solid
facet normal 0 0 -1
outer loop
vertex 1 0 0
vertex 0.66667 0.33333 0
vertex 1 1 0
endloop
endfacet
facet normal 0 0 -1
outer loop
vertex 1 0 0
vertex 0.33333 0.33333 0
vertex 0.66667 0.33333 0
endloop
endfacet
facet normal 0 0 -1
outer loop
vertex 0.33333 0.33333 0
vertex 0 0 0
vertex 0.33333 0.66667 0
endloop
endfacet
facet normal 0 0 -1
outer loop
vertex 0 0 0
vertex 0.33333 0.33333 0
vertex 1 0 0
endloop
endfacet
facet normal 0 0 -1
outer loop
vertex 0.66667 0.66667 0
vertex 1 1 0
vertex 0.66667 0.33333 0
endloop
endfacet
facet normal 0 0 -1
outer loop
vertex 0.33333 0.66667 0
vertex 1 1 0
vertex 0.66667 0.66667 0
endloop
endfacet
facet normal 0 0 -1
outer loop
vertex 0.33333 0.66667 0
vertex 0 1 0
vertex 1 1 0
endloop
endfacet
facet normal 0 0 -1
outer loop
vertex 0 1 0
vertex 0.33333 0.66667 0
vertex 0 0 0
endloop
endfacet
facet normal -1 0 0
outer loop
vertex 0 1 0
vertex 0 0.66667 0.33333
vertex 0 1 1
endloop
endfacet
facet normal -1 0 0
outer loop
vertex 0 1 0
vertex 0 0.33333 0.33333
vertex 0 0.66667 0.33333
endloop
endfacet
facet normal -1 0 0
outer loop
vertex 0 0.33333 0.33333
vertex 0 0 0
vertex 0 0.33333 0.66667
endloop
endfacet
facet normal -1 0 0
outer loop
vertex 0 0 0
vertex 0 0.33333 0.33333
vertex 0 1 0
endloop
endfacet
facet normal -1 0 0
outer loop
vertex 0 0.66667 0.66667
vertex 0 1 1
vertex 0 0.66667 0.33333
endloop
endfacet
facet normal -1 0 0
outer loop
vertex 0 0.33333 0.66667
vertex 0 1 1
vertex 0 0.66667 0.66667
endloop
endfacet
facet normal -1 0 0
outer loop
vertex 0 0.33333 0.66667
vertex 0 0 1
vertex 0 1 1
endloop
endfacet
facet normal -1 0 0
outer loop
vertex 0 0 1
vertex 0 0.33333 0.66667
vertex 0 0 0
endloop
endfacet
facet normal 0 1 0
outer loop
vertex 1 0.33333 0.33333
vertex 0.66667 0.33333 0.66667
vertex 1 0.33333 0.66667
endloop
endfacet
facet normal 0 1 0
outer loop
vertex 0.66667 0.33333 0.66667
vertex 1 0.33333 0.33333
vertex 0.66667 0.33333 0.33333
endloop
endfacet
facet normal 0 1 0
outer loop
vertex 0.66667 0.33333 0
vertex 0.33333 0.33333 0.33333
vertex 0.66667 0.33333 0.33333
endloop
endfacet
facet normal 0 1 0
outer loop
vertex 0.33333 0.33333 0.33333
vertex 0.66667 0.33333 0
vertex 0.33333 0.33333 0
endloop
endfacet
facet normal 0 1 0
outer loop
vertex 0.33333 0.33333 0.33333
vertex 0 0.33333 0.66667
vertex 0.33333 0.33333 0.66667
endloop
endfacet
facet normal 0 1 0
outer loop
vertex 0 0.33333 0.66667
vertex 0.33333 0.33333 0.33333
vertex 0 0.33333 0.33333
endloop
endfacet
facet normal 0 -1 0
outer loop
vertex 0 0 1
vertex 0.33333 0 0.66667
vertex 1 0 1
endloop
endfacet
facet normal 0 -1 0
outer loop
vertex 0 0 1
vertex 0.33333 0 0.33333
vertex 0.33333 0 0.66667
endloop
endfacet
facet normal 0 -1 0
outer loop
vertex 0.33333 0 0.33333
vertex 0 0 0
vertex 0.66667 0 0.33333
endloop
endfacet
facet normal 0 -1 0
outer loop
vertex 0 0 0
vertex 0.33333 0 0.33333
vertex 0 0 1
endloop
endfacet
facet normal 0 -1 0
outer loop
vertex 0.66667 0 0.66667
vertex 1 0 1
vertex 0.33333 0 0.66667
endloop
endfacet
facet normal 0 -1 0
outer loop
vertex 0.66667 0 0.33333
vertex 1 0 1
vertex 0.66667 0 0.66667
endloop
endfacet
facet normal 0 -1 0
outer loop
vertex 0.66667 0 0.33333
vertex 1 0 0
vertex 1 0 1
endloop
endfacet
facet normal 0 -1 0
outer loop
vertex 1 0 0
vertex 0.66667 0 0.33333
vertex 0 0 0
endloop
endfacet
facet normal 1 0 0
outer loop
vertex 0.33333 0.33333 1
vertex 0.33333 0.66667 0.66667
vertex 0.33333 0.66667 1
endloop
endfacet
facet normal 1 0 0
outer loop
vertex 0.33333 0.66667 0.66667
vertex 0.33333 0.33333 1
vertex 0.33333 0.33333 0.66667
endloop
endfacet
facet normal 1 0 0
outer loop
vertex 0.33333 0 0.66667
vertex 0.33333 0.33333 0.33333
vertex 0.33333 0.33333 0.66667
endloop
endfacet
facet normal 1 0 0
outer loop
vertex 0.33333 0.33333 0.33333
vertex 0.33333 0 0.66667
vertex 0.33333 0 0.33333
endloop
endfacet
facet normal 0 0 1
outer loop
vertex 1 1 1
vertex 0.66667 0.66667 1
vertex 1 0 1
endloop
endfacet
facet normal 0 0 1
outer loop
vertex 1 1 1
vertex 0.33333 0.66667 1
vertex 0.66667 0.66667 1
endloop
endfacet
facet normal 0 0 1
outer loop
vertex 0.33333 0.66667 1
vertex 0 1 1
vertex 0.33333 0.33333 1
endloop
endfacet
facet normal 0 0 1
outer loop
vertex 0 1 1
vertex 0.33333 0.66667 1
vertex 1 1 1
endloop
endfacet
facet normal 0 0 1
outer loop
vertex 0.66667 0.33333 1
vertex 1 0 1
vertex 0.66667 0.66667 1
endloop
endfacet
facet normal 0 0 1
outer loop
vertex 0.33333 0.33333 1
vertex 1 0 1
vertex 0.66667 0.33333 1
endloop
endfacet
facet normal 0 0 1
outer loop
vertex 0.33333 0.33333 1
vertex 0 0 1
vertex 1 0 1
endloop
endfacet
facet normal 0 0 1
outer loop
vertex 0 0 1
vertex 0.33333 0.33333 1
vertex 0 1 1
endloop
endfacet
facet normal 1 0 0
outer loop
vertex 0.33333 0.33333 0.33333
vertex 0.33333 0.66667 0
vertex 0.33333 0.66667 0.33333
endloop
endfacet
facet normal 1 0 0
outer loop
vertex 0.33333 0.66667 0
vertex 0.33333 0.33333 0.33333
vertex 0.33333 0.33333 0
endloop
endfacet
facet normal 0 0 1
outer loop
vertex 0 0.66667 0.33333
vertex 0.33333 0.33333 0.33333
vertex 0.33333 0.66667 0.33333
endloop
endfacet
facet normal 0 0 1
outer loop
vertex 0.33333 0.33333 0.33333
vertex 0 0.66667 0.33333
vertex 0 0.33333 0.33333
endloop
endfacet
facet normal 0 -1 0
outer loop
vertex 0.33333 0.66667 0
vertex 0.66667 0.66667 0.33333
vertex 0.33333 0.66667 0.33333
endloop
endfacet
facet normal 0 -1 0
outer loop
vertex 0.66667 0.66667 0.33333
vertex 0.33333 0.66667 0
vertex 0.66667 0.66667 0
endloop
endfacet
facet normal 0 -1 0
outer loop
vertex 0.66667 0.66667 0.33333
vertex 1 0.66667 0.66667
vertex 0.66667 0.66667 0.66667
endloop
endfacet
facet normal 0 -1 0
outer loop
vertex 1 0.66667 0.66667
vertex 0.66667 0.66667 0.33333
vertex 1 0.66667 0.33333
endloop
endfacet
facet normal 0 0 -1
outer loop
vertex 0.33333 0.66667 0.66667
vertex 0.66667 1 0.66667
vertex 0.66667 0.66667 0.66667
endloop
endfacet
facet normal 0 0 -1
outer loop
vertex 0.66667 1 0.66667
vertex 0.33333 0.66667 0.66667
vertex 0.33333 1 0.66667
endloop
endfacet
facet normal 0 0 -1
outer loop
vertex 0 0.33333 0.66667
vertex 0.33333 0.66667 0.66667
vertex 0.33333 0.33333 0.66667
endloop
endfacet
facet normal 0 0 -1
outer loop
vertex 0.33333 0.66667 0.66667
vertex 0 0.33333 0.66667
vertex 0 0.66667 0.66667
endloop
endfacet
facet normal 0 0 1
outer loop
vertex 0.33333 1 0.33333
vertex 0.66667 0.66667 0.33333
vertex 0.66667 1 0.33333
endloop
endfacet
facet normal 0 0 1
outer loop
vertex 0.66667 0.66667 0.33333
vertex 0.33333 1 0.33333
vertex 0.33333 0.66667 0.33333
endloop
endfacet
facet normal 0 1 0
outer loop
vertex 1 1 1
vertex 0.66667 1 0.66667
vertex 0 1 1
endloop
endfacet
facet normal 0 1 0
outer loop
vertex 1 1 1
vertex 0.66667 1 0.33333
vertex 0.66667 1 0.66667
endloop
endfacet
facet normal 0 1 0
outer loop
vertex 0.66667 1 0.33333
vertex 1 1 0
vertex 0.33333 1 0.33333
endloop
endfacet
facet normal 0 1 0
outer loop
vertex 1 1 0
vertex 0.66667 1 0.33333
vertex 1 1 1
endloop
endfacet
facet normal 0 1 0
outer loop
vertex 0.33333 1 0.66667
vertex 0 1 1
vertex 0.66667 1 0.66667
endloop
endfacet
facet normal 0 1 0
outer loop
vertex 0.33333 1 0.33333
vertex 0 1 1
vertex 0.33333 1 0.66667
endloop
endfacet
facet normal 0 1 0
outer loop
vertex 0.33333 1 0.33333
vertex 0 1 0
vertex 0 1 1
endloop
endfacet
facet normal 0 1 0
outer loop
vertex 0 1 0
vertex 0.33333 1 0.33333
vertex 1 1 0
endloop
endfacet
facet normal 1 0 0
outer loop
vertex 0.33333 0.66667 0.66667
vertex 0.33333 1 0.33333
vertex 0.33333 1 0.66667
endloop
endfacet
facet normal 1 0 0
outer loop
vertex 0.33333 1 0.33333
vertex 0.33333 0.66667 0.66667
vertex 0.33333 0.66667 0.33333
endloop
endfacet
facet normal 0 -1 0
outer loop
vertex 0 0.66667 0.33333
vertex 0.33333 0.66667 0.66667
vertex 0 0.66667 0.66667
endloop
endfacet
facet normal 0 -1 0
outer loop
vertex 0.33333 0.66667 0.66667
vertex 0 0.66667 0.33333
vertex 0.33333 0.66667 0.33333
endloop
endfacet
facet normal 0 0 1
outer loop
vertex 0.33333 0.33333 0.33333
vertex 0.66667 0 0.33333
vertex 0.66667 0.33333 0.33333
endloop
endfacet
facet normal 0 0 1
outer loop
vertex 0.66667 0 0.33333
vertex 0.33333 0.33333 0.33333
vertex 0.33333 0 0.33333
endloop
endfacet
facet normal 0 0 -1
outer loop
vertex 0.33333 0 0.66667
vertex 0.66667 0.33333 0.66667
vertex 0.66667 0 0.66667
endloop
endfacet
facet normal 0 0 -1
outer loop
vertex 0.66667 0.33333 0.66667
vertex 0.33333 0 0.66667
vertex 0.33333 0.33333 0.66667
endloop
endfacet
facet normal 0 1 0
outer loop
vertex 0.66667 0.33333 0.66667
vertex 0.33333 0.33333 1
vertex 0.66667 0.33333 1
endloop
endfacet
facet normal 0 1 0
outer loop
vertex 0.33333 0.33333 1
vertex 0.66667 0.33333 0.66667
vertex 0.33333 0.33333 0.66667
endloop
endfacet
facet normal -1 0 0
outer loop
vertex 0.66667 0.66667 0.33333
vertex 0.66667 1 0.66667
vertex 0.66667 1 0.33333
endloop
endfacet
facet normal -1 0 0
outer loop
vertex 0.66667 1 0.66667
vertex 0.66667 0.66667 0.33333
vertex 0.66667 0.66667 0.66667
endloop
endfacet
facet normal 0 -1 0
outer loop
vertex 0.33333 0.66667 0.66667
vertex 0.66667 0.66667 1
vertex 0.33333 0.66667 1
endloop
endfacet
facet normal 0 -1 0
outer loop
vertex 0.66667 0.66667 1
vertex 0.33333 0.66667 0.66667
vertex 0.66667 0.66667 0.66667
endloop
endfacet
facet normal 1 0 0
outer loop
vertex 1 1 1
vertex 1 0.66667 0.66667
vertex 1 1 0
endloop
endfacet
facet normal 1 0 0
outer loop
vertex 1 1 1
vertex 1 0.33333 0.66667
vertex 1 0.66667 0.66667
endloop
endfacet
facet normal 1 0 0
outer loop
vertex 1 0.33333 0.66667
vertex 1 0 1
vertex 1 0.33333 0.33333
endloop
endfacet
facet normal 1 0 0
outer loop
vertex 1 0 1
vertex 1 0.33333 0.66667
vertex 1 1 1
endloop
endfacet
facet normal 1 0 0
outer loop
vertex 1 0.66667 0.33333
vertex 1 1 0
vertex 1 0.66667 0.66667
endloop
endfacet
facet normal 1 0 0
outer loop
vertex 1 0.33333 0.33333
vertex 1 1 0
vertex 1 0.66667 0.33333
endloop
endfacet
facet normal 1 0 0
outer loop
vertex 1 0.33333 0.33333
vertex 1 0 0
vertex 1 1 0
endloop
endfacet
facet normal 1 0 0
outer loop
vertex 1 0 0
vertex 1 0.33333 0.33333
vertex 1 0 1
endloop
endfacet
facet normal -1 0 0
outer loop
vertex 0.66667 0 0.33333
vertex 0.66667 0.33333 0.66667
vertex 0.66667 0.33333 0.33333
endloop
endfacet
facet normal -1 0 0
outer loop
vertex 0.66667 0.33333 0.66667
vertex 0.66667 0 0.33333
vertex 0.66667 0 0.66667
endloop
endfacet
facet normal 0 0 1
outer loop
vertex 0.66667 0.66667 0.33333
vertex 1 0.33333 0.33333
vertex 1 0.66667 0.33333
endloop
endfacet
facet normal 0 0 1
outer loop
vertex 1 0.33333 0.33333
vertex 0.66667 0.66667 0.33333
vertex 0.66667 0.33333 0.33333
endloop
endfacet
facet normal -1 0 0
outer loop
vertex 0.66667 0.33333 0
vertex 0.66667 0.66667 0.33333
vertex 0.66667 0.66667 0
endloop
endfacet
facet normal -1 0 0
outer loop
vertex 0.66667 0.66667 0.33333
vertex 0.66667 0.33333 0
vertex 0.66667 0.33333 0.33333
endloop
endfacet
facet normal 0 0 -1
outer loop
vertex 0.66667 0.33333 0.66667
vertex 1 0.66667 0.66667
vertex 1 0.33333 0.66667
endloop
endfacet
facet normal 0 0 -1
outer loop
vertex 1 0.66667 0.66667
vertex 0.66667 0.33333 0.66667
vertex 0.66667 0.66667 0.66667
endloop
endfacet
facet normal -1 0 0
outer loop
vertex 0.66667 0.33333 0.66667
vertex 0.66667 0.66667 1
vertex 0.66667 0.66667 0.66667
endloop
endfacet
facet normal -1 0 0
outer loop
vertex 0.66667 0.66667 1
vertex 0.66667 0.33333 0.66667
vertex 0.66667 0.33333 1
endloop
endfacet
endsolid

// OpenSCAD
/* [Sponge] */

//  Type of sponge
sponge_type = 0;    // [0:#0 - Menger sponge,1:#1 - diagonal,2:#2 - pyramid00,3:#3 - pyramid01,4:#4 - pyramid10,5:#5 - pyramid11]

//  NOTE:   The original Menger sponge has 20^L cubes, where L is the
//          level. So, on level 8, we have 20^8 = 25600000000 cubes.
//
//  Level of sponge
level = 1;          //  [0:8]

//  Start with an inverse sponge on level 1?
start_inverse = false;

//  Flip normal/inverse between levels?
flip_to_inverse_between_levels = false;

//  Rotate sponge types between levels? If this is ON, then the sponge type above has no effect, and the sponge pattern below is used instead.
rotate_type_between_levels = false;

//  NOTE:   The range for this needs to be kept in sync with the
//          number of sponge types. Unfortunately, I don't know of
//          any way to do this dynamically, the comment needs to be
//          updated manually...
//
//  Rotate between these sponges:
sponge_pattern = [0, 0, 0, 0];  // [0:5]

/* [Position and Rotation] */

//  Center on origin?
center = false;

//  Rotation around the X axis (angles)
rot_x = 0;          // [-360:0.1:+360]

//  Rotation around the Y axis (angles)
rot_y = 0;          // [-360:0.1:+360]

//  Rotation around the Z axis (angles)
rot_z = 0;          // [-360:0.1:+360]

/*  [Hidden]  */

//  Voxels of the different types of 3x3x3 sponges for `filled == 1`.
//
//  The bitmaps are layered as follows in the below definitions:
//  bitmap = [ z2_layer, z1_layer, z0_layer ]
//  zi_layer = [ y2_row, y1_row, y0_row ]
//  yj_row = [x0_voxel, x1_voxel, x2_voxel]
//
//  In other words, the first 3x3 matrix is the top layer, then 3rd on is the
//  bottom layer. The lower left corner of each matrix is on the Z-axis. X/Y
//  grows right and up. So the array is in [z][y][x] order, but z and y are
//  flipped.
//
//  See (i.e. render) the level-1 `diagonal_bitmap` for more details.

menger_bitmap = [
    [
        [ 1, 1, 1 ],
        [ 1, 0, 1 ],
        [ 1, 1, 1 ],
    ],
    [
        [ 1, 0, 1 ],
        [ 0, 0, 0 ],
        [ 1, 0, 1 ],
    ],
    [
        [ 1, 1, 1 ],
        [ 1, 0, 1 ],
        [ 1, 1, 1 ],
    ],
];

diagonal_bitmap = [
    [
        [ 0, 0, 1 ],
        [ 0, 0, 0 ],
        [ 0, 0, 0 ],
    ],
    [
        [ 0, 0, 0 ],
        [ 0, 1, 0 ],
        [ 0, 0, 0 ],
    ],
    [
        [ 0, 0, 0 ],
        [ 0, 0, 0 ],
        [ 1, 0, 0 ],
    ],
];

pyramid00_bitmap = [
    [
        [ 0, 0, 0 ],
        [ 0, 0, 0 ],
        [ 1, 0, 0 ],
    ],
    [
        [ 0, 0, 0 ],
        [ 1, 1, 0 ],
        [ 1, 1, 0 ],
    ],
    [
        [ 1, 1, 1 ],
        [ 1, 1, 1 ],
        [ 1, 1, 1 ],
    ],
];

pyramid01_bitmap = [
    [
        [ 1, 0, 0 ],
        [ 0, 0, 0 ],
        [ 0, 0, 0 ],
    ],
    [
        [ 1, 1, 0 ],
        [ 1, 1, 0 ],
        [ 0, 0, 0 ],
    ],
    [
        [ 1, 1, 1 ],
        [ 1, 1, 1 ],
        [ 1, 1, 1 ],
    ],
];

pyramid10_bitmap = [
    [
        [ 0, 0, 0 ],
        [ 0, 0, 0 ],
        [ 0, 0, 1 ],
    ],
    [
        [ 0, 0, 0 ],
        [ 0, 1, 1 ],
        [ 0, 1, 1 ],
    ],
    [
        [ 1, 1, 1 ],
        [ 1, 1, 1 ],
        [ 1, 1, 1 ],
    ],
];

pyramid11_bitmap = [
    [
        [ 0, 0, 1 ],
        [ 0, 0, 0 ],
        [ 0, 0, 0 ],
    ],
    [
        [ 0, 1, 1 ],
        [ 0, 1, 1 ],
        [ 0, 0, 0 ],
    ],
    [
        [ 1, 1, 1 ],
        [ 1, 1, 1 ],
        [ 1, 1, 1 ],
    ],
];

//  All the bitmaps
//
//  NOTE:   Make sure the order in the customizer dropdown (see top
//          of this file) aligns with the below order or bitmaps.
bitmaps = [
    menger_bitmap,
    diagonal_bitmap,
    pyramid00_bitmap,
    pyramid01_bitmap,
    pyramid10_bitmap,
    pyramid11_bitmap,
];

//  Number of bitmaps
n_bitmaps = len(bitmaps);

module sponge(type=0, level=1, filled=1, flip=false, rotate_type=false) {
    assert(level >= 0,
        "Level of sponge must be non-negative");
    assert(filled == 0 || filled == 1,
        "Parameter `filled` must be either 0 or 1");

    if (level > 0) {
        //  If the sponge types are rotated between levels, then get the
        //  current type from the sponge pattern based on the level. Otherwise,
        //  use the specified type for the level.
        //
        //  NOTE:   We're in the `level > 0` case; level 0 is always a cube.
        this_type = rotate_type
            ? sponge_pattern[(level-1) % len(sponge_pattern)]
            : type;
        assert(0 <= this_type && this_type < n_bitmaps,
            str("Invalid sponge type: ", this_type));

        //  Level 1 and above, render the voxels out of
        //  third-sized sponges one level lower.
        //  Optionally flip to inverse.
        //
        //  NOTE:   It's easy to create 1x1x1 cubes everywhere (e.g. makes
        //          the coordinates simpler). But we want the end result to be
        //          1x1x1, so we scale everything down once this level is done.
        scale([1/3, 1/3, 1/3]) {
            for (x = [0:2], y = [0:2], z = [0:2]) {
                //  This weird [2-z][2-y][x] indexing makes sure that the
                //  bitmap definions above make sense visually and the
                //  3D coordinates make sense here.
                if (bitmaps[this_type][2-z][2-y][x] == filled) {
                    translate([x, y, z])
                    sponge(
                        type,
                        level-1,
                        flip ? 1-filled : filled,
                        flip,
                        rotate_type
                    );
                }
            }
        }
    }
    else {
        //  A level-0 sponge is just a cube, no matter its type.
        cube();
    }
}

//  The sponge is 1x1x1 in size
translation = center ? [-0.5, -0.5, -0.5] : [0,0,0];

//  Log debugging info to console

echo("========================================");

echo("bitmaps:");
for (bm = bitmaps) {
    echo(bm);
}

echo("----------------------------------------");

echo("sponge type", sponge_type);
echo("starting level", level);
echo("start inverse", start_inverse);
echo("flip to inverse between levels", flip_to_inverse_between_levels);
echo("rotate sponge type between levels", rotate_type_between_levels);
if (rotate_type_between_levels) {
    echo("sponge pattern", sponge_pattern);
}

echo("----------------------------------------");

echo("X/Y/Z rotation:", rot_x, rot_y, rot_z);
echo("center", center);

//  Render sponge
rotate(a=[rot_x, rot_y, rot_z])
translate(translation)
sponge(
    type = rotate_type_between_levels ? 0 : sponge_type,
    level = level,
    filled = start_inverse ? 0 : 1,
    flip = flip_to_inverse_between_levels,
    rotate_type = rotate_type_between_levels
);

echo("========================================");
